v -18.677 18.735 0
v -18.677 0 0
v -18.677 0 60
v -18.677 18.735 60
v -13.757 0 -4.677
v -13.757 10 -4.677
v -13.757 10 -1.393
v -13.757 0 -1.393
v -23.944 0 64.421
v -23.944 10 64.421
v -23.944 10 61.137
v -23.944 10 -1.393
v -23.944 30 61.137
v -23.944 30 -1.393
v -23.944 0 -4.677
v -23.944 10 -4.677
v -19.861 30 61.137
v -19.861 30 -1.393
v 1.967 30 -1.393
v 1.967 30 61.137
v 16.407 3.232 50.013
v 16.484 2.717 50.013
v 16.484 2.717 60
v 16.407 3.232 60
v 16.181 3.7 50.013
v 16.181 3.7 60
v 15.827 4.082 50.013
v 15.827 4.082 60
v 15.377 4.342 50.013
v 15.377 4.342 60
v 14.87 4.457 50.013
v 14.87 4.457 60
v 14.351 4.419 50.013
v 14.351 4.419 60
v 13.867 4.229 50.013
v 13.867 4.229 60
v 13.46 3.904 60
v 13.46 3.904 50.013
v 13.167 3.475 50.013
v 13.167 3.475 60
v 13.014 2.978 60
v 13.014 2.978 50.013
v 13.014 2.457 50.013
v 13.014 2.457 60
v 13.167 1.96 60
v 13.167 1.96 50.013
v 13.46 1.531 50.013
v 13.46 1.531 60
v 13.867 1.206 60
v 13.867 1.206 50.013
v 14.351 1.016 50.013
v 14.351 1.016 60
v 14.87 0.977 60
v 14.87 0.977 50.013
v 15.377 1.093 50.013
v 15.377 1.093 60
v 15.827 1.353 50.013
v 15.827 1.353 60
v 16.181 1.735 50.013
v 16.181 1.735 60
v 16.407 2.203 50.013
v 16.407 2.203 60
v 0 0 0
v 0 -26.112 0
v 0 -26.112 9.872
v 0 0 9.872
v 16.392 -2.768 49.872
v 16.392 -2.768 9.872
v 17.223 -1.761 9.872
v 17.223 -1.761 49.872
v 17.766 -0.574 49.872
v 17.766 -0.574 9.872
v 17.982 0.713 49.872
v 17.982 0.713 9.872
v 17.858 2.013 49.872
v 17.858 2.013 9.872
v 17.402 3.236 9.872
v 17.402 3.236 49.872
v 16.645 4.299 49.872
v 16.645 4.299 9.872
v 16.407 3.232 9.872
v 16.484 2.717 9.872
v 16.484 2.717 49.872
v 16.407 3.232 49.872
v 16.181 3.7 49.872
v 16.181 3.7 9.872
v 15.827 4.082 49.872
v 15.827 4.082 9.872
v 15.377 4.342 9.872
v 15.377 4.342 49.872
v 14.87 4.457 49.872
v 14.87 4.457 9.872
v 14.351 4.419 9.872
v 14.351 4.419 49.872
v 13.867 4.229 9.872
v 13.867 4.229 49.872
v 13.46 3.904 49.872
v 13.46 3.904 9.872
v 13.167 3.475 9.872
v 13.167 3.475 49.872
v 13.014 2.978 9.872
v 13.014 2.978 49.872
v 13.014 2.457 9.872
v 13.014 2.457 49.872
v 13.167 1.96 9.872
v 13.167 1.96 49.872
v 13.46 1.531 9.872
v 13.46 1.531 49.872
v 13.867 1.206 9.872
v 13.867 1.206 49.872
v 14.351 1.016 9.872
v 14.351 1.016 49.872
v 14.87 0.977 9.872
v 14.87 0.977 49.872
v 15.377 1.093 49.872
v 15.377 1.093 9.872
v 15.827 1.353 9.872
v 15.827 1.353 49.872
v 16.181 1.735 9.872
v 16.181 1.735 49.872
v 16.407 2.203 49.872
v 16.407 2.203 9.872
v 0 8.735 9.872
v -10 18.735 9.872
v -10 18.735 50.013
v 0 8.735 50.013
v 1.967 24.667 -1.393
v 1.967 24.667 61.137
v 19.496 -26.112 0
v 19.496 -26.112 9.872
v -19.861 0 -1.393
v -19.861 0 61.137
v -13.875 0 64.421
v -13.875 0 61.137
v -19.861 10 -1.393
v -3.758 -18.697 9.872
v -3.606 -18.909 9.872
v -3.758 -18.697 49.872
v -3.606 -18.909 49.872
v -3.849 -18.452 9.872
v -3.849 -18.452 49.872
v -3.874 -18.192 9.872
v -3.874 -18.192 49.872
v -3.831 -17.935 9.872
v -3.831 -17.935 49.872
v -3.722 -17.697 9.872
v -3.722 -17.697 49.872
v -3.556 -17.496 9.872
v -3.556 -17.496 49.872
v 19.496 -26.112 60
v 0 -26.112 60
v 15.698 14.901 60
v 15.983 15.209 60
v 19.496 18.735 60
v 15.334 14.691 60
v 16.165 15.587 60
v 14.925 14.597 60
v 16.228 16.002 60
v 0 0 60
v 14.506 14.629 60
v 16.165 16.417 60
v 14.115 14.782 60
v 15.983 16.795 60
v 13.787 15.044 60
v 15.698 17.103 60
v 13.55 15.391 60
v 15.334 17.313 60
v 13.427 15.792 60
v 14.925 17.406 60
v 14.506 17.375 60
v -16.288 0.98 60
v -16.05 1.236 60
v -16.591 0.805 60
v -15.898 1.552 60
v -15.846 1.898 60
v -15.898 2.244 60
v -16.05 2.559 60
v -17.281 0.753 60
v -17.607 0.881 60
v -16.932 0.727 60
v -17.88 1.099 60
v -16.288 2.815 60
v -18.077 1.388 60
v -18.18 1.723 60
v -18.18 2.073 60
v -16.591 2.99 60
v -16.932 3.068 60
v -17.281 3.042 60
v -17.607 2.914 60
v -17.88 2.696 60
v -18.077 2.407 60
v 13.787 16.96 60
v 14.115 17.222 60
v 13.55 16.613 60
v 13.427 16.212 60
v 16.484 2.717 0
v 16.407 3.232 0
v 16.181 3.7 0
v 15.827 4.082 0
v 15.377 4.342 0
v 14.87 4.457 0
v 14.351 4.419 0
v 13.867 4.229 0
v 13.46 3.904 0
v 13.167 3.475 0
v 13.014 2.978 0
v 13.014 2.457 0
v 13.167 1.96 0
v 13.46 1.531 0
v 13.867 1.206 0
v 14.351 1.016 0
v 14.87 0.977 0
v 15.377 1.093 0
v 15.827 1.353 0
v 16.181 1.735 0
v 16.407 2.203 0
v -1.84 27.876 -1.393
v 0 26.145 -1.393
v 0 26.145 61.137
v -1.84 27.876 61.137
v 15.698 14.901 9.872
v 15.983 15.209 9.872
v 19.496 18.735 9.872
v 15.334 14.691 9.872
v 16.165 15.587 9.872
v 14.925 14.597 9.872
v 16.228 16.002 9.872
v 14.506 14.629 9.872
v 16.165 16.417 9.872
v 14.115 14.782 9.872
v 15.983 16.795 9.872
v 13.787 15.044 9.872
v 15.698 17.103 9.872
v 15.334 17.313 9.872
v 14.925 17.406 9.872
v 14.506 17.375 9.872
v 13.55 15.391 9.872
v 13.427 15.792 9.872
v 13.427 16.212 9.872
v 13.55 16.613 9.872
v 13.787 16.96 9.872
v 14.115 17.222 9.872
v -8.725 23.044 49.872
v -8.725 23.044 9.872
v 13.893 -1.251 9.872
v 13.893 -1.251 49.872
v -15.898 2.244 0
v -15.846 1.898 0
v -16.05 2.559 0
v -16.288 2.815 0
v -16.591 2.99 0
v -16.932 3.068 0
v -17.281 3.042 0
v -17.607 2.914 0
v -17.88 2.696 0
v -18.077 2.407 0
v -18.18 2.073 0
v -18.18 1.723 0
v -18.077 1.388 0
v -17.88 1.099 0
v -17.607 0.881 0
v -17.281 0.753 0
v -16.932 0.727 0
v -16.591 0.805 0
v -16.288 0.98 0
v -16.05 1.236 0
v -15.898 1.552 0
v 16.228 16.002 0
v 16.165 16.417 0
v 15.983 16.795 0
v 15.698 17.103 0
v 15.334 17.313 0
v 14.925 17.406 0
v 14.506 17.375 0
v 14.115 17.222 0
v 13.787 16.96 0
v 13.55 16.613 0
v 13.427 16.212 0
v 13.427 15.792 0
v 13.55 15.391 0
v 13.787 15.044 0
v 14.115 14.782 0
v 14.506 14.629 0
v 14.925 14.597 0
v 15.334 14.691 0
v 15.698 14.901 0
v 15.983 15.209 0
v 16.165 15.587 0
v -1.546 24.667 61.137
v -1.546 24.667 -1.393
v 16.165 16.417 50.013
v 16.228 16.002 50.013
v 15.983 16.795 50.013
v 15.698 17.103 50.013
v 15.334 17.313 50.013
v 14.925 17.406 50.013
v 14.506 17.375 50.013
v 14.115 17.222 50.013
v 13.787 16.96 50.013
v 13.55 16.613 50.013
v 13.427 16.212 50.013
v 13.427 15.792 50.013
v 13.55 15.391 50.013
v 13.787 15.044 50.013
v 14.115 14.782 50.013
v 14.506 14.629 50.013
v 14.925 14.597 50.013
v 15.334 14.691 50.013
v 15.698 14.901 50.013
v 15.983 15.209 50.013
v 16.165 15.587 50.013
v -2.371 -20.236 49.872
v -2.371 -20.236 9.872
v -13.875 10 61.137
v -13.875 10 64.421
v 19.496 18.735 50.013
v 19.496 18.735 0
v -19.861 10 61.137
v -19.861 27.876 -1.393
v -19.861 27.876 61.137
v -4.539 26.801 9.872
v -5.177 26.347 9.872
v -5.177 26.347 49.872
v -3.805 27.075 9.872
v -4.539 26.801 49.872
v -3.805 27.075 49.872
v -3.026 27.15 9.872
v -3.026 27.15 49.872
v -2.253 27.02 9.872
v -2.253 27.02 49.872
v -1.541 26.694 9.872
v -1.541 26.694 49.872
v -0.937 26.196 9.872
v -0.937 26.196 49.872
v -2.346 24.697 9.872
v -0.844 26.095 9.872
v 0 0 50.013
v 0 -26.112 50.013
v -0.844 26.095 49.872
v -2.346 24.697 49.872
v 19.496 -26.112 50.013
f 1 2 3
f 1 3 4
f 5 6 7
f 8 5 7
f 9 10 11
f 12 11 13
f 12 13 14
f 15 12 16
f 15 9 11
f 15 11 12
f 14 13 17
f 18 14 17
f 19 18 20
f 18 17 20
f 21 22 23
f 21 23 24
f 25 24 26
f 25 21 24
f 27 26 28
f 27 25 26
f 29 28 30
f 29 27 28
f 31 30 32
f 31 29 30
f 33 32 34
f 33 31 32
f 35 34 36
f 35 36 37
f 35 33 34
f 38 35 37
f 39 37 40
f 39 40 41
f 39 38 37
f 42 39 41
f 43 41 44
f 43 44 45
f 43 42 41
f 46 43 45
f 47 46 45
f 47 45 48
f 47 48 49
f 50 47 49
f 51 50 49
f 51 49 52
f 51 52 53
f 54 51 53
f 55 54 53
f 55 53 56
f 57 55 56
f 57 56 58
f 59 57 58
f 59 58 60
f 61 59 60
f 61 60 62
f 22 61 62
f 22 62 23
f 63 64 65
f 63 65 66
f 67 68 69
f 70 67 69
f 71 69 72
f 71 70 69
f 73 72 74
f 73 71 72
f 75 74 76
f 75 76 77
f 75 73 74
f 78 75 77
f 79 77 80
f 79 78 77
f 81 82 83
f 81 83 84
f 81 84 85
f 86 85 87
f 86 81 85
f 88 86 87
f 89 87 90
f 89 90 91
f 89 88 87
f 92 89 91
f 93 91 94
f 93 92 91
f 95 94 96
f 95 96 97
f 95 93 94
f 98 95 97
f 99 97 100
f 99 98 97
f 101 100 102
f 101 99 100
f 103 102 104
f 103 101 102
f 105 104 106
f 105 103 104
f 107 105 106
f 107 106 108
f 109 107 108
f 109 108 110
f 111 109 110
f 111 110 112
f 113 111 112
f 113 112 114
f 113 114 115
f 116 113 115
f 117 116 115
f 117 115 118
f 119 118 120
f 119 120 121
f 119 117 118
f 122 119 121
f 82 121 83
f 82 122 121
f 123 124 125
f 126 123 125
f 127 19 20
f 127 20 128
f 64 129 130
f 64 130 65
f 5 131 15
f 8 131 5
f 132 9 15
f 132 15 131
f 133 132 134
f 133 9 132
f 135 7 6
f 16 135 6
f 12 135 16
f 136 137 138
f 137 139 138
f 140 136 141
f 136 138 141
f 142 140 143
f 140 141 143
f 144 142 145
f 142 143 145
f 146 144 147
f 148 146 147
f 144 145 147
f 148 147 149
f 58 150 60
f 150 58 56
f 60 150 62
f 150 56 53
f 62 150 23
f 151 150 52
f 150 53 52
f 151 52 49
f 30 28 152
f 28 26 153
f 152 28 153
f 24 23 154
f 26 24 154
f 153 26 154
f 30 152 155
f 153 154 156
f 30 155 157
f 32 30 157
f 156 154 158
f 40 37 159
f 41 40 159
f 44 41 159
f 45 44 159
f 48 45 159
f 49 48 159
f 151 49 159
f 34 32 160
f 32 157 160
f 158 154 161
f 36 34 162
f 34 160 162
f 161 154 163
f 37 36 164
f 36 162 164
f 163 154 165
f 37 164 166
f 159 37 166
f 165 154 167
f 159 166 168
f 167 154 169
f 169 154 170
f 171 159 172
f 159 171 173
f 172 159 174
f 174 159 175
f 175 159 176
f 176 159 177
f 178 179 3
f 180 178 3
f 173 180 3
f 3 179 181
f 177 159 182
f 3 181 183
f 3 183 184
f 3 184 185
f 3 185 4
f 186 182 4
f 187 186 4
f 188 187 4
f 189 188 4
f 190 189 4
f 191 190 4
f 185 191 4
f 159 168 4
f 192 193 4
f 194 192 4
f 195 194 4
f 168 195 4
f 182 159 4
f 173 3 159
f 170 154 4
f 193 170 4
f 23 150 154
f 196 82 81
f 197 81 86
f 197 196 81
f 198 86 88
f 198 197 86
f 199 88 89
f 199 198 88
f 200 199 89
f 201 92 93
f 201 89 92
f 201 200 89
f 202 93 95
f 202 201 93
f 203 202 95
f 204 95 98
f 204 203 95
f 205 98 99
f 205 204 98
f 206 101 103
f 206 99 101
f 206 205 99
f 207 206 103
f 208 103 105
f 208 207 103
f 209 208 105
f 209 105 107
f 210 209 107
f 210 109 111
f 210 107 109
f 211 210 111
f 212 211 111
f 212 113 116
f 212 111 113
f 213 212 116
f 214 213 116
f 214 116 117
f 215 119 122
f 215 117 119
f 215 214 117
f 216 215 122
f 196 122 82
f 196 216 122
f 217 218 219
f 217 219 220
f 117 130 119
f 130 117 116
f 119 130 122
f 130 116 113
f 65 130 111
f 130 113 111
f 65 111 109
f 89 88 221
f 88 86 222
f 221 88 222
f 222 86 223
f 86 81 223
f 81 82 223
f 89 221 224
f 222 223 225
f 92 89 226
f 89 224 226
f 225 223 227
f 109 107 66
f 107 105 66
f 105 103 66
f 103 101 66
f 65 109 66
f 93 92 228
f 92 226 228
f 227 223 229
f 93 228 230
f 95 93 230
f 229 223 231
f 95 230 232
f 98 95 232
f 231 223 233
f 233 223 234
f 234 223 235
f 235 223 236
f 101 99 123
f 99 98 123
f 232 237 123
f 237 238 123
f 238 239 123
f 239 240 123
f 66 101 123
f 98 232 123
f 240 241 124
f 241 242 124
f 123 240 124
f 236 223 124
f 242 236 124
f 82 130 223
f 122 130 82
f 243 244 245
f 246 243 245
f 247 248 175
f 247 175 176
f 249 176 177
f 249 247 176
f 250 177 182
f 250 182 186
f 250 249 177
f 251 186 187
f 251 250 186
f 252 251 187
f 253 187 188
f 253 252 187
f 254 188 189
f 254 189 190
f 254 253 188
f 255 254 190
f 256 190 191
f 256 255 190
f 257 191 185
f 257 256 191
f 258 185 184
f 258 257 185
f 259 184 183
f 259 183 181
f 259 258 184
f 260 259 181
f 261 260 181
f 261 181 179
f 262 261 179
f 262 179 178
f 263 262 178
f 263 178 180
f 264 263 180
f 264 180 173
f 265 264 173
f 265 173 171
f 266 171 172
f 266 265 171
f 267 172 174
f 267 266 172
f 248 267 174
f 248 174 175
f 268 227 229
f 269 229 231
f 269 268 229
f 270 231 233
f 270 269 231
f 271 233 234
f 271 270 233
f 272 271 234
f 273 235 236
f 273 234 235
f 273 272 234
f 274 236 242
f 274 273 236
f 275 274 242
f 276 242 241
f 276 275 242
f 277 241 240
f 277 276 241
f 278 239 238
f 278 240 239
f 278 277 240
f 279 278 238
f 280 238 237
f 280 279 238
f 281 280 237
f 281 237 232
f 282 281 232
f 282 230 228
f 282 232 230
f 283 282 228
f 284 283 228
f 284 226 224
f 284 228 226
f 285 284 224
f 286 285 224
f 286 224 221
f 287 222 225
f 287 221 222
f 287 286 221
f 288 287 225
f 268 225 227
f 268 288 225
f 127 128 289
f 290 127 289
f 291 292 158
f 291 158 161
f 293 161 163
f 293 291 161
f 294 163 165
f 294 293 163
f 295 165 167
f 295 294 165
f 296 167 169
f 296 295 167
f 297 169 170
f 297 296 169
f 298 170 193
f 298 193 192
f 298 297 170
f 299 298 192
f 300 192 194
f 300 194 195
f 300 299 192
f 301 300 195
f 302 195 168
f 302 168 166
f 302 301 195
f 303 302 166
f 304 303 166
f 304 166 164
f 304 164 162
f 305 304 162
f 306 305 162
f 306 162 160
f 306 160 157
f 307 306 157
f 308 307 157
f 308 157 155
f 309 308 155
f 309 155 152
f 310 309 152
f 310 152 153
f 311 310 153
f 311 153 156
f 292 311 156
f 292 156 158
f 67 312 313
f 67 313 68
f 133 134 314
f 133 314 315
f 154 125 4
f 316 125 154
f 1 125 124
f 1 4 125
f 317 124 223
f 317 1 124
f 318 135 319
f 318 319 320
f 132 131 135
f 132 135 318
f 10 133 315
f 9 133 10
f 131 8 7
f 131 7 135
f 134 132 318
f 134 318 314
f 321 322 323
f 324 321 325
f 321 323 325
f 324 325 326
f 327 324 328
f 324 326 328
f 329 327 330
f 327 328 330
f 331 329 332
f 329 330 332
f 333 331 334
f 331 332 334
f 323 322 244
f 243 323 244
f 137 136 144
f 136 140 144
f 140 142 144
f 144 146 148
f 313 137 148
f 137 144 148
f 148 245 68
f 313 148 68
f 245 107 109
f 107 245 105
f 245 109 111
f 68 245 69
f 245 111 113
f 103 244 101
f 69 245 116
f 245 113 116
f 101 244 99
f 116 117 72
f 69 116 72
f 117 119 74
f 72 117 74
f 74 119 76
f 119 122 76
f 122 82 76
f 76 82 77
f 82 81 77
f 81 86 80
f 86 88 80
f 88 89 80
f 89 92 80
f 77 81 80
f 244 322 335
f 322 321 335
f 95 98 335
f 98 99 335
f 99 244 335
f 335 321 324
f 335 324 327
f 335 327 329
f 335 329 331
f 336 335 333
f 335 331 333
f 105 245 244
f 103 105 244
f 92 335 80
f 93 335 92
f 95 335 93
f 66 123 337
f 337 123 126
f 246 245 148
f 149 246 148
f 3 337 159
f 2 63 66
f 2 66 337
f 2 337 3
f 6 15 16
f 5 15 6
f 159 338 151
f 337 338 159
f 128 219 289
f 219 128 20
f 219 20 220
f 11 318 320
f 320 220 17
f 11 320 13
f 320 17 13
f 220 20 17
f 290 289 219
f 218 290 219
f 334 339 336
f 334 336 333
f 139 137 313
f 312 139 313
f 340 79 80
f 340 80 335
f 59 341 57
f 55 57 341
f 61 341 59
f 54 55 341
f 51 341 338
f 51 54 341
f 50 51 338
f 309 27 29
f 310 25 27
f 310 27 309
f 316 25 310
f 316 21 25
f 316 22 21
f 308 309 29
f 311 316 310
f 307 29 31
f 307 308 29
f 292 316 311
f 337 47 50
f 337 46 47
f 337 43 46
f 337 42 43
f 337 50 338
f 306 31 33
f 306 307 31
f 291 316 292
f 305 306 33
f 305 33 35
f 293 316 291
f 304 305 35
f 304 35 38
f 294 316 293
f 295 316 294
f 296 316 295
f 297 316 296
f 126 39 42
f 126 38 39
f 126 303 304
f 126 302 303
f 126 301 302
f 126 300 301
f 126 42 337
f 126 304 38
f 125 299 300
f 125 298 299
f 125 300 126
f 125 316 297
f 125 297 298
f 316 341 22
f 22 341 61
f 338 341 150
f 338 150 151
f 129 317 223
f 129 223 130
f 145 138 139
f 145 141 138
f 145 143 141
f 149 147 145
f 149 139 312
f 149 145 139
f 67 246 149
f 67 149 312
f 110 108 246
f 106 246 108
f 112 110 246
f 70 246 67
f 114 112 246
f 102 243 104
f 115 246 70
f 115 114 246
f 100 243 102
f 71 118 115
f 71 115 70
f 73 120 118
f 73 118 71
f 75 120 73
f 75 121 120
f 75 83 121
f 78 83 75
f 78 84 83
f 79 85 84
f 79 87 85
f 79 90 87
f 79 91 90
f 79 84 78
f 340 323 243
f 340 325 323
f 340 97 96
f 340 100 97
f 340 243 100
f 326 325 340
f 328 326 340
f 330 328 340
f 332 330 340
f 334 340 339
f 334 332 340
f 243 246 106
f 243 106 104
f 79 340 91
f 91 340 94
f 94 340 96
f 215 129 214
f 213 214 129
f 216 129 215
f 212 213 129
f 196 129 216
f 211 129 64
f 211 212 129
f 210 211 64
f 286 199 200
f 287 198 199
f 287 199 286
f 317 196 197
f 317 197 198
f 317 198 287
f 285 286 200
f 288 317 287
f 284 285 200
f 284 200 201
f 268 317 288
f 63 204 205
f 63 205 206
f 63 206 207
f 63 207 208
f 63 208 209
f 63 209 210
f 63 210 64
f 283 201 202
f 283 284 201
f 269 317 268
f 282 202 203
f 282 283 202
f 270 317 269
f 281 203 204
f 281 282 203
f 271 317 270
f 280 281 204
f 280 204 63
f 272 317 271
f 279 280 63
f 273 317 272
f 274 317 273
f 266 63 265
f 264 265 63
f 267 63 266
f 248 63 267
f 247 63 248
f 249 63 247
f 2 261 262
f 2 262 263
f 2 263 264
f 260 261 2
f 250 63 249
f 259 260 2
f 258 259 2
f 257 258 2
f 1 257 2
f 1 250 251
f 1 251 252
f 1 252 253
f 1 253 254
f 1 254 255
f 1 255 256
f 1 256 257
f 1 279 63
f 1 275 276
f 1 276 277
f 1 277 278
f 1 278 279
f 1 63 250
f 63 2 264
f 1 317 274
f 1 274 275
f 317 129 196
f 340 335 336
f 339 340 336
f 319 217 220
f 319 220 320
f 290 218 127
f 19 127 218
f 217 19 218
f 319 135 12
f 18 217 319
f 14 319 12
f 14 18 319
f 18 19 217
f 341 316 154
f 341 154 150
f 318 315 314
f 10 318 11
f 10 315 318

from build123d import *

# Parameters (mm, degrees)
SKETCH_R        = 1.744844
SKETCH_R_2      = 1.408452
SKETCH_R_3      = 1.173705
PAD_DEPTH       = 60
SKETCH001_W     = 19.496452
SKETCH001_H     = 40.140847
POCKET_DEPTH    = 44.848774
CHAMFER_SIZE    = 10
SKETCH002_R     = 1.744844
PAD001_DEPTH    = 40
FILLET_R        = 5
FILLET001_R     = 1
FILLET002_R     = 3
PAD002_DEPTH    = 30
SKETCH004_W     = 10.069124
SKETCH004_H     = 3.2845556667
SKETCH004_W_2   = 10.1873559999
POCKET001_DEPTH = 20
PAD003_DEPTH    = 62.529275


with BuildPart() as corps:
    # Sketch → Pad (new body)
    with BuildSketch(Plane.XY):
        Polygon((0, 0), (-18.676844, 0), (-18.676844, 18.735422), (19.496452, 18.735422), (19.496452, -26.112352), (0, -26.112352), align=None)
        with Locations((14.739244, 2.717445)):
            Circle(SKETCH_R, mode=Mode.SUBTRACT)
        with Locations((14.819427, 16.001925)):
            Circle(SKETCH_R_2, mode=Mode.SUBTRACT)
        with Locations((-17.019724, 1.897619)):
            Circle(SKETCH_R_3, mode=Mode.SUBTRACT)
    extrude(amount=PAD_DEPTH)

    # Sketch001 (on Face3 of Pad) → Pocket (cut, through all)
    with BuildSketch(Plane(origin=(0, 18.735422, 0), x_dir=(-1, 0, 0), z_dir=(0, 1, 0))):
        with Locations((-9.748226, 29.9426915)):
            Rectangle(SKETCH001_W, SKETCH001_H)
    extrude(amount=-POCKET_DEPTH, mode=Mode.SUBTRACT)

    # Chamfer
    chamfer_edges = [corps.edges().sort_by_distance(p)[0] for p in [
        (0, 18.735422, 29.942692),
    ]]
    chamfer(chamfer_edges, length=CHAMFER_SIZE)


with BuildPart() as corps001:
    # Sketch002 (on Face1 of CopyChamfer) → Pad001 (new body)
    with BuildSketch(Plane.XY.offset(9.872268)):
        Polygon((-8.7249473249, 23.0442047805), (13.8934580907, -1.2507139475), (-4.2878532232, -18.1773921097), (-2.3710238866, -20.2362999812), (20.0518335164, 0.6392289718), (-2.3458496685, 24.6970651752), (-0.8438262999, 26.0954387971), (-2.9813778673, 28.3914291931), align=None)
        with Locations((14.739244, 2.717445)):
            Circle(SKETCH002_R, mode=Mode.SUBTRACT)
    extrude(amount=PAD001_DEPTH)

    # Fillet
    fillet_edges = [corps001.edges().sort_by_distance(p)[0] for p in [
        (20.051834, 0.639229, 29.872268),
    ]]
    fillet(fillet_edges, radius=FILLET_R)

    # Fillet001
    fillet001_edges = [corps001.edges().sort_by_distance(p)[0] for p in [
        (-4.287853, -18.177392, 29.872268),
    ]]
    fillet(fillet001_edges, radius=FILLET001_R)

    # Fillet002
    fillet002_edges = [corps001.edges().sort_by_distance(p)[0] for p in [
        (-2.981378, 28.391429, 29.872268),
    ]]
    fillet(fillet002_edges, radius=FILLET002_R)


with BuildPart() as corps002:
    # Sketch003 (on Face1 of CopyChamfer001) → Pad002 (new body)
    with BuildSketch(Plane.XZ):
        Polygon((-19.861139, 61.1365553333), (-13.8752310001, 61.1365553333), (-13.8752310001, 64.421111), (-23.944355, 64.421111), (-23.944355, -4.6772753333), (-13.7569990001, -4.6772753333), (-13.7569990001, -1.3927196667), (-19.861139, -1.3927196667), align=None)
    extrude(amount=-PAD002_DEPTH)

    # Sketch004 (on Face10 of Pad002) → Pocket001 (cut)
    with BuildSketch(Plane(origin=(0, 30, 0), x_dir=(-1, 0, 0), z_dir=(0, 1, 0))):
        with Locations((18.909793, 62.7788331667)):
            Rectangle(SKETCH004_W, SKETCH004_H)
        with Locations((18.8506770001, -3.0349975)):
            Rectangle(SKETCH004_W_2, SKETCH004_H)
    extrude(amount=-POCKET001_DEPTH, mode=Mode.SUBTRACT)

    # Sketch005 (on Face11 of Pocket001) → Pad003 (join)
    with BuildSketch(Plane.XY.offset(61.1365553333)):
        Polygon((-19.861139, 30), (1.966555, 30), (1.966555, 24.667326), (-1.546323, 24.667326), (0, 26.14539), (-1.840461, 27.875839), (-19.861139, 27.875839), align=None)
    extrude(amount=-PAD003_DEPTH)


solid = Compound([corps.part, corps001.part, corps002.part])
